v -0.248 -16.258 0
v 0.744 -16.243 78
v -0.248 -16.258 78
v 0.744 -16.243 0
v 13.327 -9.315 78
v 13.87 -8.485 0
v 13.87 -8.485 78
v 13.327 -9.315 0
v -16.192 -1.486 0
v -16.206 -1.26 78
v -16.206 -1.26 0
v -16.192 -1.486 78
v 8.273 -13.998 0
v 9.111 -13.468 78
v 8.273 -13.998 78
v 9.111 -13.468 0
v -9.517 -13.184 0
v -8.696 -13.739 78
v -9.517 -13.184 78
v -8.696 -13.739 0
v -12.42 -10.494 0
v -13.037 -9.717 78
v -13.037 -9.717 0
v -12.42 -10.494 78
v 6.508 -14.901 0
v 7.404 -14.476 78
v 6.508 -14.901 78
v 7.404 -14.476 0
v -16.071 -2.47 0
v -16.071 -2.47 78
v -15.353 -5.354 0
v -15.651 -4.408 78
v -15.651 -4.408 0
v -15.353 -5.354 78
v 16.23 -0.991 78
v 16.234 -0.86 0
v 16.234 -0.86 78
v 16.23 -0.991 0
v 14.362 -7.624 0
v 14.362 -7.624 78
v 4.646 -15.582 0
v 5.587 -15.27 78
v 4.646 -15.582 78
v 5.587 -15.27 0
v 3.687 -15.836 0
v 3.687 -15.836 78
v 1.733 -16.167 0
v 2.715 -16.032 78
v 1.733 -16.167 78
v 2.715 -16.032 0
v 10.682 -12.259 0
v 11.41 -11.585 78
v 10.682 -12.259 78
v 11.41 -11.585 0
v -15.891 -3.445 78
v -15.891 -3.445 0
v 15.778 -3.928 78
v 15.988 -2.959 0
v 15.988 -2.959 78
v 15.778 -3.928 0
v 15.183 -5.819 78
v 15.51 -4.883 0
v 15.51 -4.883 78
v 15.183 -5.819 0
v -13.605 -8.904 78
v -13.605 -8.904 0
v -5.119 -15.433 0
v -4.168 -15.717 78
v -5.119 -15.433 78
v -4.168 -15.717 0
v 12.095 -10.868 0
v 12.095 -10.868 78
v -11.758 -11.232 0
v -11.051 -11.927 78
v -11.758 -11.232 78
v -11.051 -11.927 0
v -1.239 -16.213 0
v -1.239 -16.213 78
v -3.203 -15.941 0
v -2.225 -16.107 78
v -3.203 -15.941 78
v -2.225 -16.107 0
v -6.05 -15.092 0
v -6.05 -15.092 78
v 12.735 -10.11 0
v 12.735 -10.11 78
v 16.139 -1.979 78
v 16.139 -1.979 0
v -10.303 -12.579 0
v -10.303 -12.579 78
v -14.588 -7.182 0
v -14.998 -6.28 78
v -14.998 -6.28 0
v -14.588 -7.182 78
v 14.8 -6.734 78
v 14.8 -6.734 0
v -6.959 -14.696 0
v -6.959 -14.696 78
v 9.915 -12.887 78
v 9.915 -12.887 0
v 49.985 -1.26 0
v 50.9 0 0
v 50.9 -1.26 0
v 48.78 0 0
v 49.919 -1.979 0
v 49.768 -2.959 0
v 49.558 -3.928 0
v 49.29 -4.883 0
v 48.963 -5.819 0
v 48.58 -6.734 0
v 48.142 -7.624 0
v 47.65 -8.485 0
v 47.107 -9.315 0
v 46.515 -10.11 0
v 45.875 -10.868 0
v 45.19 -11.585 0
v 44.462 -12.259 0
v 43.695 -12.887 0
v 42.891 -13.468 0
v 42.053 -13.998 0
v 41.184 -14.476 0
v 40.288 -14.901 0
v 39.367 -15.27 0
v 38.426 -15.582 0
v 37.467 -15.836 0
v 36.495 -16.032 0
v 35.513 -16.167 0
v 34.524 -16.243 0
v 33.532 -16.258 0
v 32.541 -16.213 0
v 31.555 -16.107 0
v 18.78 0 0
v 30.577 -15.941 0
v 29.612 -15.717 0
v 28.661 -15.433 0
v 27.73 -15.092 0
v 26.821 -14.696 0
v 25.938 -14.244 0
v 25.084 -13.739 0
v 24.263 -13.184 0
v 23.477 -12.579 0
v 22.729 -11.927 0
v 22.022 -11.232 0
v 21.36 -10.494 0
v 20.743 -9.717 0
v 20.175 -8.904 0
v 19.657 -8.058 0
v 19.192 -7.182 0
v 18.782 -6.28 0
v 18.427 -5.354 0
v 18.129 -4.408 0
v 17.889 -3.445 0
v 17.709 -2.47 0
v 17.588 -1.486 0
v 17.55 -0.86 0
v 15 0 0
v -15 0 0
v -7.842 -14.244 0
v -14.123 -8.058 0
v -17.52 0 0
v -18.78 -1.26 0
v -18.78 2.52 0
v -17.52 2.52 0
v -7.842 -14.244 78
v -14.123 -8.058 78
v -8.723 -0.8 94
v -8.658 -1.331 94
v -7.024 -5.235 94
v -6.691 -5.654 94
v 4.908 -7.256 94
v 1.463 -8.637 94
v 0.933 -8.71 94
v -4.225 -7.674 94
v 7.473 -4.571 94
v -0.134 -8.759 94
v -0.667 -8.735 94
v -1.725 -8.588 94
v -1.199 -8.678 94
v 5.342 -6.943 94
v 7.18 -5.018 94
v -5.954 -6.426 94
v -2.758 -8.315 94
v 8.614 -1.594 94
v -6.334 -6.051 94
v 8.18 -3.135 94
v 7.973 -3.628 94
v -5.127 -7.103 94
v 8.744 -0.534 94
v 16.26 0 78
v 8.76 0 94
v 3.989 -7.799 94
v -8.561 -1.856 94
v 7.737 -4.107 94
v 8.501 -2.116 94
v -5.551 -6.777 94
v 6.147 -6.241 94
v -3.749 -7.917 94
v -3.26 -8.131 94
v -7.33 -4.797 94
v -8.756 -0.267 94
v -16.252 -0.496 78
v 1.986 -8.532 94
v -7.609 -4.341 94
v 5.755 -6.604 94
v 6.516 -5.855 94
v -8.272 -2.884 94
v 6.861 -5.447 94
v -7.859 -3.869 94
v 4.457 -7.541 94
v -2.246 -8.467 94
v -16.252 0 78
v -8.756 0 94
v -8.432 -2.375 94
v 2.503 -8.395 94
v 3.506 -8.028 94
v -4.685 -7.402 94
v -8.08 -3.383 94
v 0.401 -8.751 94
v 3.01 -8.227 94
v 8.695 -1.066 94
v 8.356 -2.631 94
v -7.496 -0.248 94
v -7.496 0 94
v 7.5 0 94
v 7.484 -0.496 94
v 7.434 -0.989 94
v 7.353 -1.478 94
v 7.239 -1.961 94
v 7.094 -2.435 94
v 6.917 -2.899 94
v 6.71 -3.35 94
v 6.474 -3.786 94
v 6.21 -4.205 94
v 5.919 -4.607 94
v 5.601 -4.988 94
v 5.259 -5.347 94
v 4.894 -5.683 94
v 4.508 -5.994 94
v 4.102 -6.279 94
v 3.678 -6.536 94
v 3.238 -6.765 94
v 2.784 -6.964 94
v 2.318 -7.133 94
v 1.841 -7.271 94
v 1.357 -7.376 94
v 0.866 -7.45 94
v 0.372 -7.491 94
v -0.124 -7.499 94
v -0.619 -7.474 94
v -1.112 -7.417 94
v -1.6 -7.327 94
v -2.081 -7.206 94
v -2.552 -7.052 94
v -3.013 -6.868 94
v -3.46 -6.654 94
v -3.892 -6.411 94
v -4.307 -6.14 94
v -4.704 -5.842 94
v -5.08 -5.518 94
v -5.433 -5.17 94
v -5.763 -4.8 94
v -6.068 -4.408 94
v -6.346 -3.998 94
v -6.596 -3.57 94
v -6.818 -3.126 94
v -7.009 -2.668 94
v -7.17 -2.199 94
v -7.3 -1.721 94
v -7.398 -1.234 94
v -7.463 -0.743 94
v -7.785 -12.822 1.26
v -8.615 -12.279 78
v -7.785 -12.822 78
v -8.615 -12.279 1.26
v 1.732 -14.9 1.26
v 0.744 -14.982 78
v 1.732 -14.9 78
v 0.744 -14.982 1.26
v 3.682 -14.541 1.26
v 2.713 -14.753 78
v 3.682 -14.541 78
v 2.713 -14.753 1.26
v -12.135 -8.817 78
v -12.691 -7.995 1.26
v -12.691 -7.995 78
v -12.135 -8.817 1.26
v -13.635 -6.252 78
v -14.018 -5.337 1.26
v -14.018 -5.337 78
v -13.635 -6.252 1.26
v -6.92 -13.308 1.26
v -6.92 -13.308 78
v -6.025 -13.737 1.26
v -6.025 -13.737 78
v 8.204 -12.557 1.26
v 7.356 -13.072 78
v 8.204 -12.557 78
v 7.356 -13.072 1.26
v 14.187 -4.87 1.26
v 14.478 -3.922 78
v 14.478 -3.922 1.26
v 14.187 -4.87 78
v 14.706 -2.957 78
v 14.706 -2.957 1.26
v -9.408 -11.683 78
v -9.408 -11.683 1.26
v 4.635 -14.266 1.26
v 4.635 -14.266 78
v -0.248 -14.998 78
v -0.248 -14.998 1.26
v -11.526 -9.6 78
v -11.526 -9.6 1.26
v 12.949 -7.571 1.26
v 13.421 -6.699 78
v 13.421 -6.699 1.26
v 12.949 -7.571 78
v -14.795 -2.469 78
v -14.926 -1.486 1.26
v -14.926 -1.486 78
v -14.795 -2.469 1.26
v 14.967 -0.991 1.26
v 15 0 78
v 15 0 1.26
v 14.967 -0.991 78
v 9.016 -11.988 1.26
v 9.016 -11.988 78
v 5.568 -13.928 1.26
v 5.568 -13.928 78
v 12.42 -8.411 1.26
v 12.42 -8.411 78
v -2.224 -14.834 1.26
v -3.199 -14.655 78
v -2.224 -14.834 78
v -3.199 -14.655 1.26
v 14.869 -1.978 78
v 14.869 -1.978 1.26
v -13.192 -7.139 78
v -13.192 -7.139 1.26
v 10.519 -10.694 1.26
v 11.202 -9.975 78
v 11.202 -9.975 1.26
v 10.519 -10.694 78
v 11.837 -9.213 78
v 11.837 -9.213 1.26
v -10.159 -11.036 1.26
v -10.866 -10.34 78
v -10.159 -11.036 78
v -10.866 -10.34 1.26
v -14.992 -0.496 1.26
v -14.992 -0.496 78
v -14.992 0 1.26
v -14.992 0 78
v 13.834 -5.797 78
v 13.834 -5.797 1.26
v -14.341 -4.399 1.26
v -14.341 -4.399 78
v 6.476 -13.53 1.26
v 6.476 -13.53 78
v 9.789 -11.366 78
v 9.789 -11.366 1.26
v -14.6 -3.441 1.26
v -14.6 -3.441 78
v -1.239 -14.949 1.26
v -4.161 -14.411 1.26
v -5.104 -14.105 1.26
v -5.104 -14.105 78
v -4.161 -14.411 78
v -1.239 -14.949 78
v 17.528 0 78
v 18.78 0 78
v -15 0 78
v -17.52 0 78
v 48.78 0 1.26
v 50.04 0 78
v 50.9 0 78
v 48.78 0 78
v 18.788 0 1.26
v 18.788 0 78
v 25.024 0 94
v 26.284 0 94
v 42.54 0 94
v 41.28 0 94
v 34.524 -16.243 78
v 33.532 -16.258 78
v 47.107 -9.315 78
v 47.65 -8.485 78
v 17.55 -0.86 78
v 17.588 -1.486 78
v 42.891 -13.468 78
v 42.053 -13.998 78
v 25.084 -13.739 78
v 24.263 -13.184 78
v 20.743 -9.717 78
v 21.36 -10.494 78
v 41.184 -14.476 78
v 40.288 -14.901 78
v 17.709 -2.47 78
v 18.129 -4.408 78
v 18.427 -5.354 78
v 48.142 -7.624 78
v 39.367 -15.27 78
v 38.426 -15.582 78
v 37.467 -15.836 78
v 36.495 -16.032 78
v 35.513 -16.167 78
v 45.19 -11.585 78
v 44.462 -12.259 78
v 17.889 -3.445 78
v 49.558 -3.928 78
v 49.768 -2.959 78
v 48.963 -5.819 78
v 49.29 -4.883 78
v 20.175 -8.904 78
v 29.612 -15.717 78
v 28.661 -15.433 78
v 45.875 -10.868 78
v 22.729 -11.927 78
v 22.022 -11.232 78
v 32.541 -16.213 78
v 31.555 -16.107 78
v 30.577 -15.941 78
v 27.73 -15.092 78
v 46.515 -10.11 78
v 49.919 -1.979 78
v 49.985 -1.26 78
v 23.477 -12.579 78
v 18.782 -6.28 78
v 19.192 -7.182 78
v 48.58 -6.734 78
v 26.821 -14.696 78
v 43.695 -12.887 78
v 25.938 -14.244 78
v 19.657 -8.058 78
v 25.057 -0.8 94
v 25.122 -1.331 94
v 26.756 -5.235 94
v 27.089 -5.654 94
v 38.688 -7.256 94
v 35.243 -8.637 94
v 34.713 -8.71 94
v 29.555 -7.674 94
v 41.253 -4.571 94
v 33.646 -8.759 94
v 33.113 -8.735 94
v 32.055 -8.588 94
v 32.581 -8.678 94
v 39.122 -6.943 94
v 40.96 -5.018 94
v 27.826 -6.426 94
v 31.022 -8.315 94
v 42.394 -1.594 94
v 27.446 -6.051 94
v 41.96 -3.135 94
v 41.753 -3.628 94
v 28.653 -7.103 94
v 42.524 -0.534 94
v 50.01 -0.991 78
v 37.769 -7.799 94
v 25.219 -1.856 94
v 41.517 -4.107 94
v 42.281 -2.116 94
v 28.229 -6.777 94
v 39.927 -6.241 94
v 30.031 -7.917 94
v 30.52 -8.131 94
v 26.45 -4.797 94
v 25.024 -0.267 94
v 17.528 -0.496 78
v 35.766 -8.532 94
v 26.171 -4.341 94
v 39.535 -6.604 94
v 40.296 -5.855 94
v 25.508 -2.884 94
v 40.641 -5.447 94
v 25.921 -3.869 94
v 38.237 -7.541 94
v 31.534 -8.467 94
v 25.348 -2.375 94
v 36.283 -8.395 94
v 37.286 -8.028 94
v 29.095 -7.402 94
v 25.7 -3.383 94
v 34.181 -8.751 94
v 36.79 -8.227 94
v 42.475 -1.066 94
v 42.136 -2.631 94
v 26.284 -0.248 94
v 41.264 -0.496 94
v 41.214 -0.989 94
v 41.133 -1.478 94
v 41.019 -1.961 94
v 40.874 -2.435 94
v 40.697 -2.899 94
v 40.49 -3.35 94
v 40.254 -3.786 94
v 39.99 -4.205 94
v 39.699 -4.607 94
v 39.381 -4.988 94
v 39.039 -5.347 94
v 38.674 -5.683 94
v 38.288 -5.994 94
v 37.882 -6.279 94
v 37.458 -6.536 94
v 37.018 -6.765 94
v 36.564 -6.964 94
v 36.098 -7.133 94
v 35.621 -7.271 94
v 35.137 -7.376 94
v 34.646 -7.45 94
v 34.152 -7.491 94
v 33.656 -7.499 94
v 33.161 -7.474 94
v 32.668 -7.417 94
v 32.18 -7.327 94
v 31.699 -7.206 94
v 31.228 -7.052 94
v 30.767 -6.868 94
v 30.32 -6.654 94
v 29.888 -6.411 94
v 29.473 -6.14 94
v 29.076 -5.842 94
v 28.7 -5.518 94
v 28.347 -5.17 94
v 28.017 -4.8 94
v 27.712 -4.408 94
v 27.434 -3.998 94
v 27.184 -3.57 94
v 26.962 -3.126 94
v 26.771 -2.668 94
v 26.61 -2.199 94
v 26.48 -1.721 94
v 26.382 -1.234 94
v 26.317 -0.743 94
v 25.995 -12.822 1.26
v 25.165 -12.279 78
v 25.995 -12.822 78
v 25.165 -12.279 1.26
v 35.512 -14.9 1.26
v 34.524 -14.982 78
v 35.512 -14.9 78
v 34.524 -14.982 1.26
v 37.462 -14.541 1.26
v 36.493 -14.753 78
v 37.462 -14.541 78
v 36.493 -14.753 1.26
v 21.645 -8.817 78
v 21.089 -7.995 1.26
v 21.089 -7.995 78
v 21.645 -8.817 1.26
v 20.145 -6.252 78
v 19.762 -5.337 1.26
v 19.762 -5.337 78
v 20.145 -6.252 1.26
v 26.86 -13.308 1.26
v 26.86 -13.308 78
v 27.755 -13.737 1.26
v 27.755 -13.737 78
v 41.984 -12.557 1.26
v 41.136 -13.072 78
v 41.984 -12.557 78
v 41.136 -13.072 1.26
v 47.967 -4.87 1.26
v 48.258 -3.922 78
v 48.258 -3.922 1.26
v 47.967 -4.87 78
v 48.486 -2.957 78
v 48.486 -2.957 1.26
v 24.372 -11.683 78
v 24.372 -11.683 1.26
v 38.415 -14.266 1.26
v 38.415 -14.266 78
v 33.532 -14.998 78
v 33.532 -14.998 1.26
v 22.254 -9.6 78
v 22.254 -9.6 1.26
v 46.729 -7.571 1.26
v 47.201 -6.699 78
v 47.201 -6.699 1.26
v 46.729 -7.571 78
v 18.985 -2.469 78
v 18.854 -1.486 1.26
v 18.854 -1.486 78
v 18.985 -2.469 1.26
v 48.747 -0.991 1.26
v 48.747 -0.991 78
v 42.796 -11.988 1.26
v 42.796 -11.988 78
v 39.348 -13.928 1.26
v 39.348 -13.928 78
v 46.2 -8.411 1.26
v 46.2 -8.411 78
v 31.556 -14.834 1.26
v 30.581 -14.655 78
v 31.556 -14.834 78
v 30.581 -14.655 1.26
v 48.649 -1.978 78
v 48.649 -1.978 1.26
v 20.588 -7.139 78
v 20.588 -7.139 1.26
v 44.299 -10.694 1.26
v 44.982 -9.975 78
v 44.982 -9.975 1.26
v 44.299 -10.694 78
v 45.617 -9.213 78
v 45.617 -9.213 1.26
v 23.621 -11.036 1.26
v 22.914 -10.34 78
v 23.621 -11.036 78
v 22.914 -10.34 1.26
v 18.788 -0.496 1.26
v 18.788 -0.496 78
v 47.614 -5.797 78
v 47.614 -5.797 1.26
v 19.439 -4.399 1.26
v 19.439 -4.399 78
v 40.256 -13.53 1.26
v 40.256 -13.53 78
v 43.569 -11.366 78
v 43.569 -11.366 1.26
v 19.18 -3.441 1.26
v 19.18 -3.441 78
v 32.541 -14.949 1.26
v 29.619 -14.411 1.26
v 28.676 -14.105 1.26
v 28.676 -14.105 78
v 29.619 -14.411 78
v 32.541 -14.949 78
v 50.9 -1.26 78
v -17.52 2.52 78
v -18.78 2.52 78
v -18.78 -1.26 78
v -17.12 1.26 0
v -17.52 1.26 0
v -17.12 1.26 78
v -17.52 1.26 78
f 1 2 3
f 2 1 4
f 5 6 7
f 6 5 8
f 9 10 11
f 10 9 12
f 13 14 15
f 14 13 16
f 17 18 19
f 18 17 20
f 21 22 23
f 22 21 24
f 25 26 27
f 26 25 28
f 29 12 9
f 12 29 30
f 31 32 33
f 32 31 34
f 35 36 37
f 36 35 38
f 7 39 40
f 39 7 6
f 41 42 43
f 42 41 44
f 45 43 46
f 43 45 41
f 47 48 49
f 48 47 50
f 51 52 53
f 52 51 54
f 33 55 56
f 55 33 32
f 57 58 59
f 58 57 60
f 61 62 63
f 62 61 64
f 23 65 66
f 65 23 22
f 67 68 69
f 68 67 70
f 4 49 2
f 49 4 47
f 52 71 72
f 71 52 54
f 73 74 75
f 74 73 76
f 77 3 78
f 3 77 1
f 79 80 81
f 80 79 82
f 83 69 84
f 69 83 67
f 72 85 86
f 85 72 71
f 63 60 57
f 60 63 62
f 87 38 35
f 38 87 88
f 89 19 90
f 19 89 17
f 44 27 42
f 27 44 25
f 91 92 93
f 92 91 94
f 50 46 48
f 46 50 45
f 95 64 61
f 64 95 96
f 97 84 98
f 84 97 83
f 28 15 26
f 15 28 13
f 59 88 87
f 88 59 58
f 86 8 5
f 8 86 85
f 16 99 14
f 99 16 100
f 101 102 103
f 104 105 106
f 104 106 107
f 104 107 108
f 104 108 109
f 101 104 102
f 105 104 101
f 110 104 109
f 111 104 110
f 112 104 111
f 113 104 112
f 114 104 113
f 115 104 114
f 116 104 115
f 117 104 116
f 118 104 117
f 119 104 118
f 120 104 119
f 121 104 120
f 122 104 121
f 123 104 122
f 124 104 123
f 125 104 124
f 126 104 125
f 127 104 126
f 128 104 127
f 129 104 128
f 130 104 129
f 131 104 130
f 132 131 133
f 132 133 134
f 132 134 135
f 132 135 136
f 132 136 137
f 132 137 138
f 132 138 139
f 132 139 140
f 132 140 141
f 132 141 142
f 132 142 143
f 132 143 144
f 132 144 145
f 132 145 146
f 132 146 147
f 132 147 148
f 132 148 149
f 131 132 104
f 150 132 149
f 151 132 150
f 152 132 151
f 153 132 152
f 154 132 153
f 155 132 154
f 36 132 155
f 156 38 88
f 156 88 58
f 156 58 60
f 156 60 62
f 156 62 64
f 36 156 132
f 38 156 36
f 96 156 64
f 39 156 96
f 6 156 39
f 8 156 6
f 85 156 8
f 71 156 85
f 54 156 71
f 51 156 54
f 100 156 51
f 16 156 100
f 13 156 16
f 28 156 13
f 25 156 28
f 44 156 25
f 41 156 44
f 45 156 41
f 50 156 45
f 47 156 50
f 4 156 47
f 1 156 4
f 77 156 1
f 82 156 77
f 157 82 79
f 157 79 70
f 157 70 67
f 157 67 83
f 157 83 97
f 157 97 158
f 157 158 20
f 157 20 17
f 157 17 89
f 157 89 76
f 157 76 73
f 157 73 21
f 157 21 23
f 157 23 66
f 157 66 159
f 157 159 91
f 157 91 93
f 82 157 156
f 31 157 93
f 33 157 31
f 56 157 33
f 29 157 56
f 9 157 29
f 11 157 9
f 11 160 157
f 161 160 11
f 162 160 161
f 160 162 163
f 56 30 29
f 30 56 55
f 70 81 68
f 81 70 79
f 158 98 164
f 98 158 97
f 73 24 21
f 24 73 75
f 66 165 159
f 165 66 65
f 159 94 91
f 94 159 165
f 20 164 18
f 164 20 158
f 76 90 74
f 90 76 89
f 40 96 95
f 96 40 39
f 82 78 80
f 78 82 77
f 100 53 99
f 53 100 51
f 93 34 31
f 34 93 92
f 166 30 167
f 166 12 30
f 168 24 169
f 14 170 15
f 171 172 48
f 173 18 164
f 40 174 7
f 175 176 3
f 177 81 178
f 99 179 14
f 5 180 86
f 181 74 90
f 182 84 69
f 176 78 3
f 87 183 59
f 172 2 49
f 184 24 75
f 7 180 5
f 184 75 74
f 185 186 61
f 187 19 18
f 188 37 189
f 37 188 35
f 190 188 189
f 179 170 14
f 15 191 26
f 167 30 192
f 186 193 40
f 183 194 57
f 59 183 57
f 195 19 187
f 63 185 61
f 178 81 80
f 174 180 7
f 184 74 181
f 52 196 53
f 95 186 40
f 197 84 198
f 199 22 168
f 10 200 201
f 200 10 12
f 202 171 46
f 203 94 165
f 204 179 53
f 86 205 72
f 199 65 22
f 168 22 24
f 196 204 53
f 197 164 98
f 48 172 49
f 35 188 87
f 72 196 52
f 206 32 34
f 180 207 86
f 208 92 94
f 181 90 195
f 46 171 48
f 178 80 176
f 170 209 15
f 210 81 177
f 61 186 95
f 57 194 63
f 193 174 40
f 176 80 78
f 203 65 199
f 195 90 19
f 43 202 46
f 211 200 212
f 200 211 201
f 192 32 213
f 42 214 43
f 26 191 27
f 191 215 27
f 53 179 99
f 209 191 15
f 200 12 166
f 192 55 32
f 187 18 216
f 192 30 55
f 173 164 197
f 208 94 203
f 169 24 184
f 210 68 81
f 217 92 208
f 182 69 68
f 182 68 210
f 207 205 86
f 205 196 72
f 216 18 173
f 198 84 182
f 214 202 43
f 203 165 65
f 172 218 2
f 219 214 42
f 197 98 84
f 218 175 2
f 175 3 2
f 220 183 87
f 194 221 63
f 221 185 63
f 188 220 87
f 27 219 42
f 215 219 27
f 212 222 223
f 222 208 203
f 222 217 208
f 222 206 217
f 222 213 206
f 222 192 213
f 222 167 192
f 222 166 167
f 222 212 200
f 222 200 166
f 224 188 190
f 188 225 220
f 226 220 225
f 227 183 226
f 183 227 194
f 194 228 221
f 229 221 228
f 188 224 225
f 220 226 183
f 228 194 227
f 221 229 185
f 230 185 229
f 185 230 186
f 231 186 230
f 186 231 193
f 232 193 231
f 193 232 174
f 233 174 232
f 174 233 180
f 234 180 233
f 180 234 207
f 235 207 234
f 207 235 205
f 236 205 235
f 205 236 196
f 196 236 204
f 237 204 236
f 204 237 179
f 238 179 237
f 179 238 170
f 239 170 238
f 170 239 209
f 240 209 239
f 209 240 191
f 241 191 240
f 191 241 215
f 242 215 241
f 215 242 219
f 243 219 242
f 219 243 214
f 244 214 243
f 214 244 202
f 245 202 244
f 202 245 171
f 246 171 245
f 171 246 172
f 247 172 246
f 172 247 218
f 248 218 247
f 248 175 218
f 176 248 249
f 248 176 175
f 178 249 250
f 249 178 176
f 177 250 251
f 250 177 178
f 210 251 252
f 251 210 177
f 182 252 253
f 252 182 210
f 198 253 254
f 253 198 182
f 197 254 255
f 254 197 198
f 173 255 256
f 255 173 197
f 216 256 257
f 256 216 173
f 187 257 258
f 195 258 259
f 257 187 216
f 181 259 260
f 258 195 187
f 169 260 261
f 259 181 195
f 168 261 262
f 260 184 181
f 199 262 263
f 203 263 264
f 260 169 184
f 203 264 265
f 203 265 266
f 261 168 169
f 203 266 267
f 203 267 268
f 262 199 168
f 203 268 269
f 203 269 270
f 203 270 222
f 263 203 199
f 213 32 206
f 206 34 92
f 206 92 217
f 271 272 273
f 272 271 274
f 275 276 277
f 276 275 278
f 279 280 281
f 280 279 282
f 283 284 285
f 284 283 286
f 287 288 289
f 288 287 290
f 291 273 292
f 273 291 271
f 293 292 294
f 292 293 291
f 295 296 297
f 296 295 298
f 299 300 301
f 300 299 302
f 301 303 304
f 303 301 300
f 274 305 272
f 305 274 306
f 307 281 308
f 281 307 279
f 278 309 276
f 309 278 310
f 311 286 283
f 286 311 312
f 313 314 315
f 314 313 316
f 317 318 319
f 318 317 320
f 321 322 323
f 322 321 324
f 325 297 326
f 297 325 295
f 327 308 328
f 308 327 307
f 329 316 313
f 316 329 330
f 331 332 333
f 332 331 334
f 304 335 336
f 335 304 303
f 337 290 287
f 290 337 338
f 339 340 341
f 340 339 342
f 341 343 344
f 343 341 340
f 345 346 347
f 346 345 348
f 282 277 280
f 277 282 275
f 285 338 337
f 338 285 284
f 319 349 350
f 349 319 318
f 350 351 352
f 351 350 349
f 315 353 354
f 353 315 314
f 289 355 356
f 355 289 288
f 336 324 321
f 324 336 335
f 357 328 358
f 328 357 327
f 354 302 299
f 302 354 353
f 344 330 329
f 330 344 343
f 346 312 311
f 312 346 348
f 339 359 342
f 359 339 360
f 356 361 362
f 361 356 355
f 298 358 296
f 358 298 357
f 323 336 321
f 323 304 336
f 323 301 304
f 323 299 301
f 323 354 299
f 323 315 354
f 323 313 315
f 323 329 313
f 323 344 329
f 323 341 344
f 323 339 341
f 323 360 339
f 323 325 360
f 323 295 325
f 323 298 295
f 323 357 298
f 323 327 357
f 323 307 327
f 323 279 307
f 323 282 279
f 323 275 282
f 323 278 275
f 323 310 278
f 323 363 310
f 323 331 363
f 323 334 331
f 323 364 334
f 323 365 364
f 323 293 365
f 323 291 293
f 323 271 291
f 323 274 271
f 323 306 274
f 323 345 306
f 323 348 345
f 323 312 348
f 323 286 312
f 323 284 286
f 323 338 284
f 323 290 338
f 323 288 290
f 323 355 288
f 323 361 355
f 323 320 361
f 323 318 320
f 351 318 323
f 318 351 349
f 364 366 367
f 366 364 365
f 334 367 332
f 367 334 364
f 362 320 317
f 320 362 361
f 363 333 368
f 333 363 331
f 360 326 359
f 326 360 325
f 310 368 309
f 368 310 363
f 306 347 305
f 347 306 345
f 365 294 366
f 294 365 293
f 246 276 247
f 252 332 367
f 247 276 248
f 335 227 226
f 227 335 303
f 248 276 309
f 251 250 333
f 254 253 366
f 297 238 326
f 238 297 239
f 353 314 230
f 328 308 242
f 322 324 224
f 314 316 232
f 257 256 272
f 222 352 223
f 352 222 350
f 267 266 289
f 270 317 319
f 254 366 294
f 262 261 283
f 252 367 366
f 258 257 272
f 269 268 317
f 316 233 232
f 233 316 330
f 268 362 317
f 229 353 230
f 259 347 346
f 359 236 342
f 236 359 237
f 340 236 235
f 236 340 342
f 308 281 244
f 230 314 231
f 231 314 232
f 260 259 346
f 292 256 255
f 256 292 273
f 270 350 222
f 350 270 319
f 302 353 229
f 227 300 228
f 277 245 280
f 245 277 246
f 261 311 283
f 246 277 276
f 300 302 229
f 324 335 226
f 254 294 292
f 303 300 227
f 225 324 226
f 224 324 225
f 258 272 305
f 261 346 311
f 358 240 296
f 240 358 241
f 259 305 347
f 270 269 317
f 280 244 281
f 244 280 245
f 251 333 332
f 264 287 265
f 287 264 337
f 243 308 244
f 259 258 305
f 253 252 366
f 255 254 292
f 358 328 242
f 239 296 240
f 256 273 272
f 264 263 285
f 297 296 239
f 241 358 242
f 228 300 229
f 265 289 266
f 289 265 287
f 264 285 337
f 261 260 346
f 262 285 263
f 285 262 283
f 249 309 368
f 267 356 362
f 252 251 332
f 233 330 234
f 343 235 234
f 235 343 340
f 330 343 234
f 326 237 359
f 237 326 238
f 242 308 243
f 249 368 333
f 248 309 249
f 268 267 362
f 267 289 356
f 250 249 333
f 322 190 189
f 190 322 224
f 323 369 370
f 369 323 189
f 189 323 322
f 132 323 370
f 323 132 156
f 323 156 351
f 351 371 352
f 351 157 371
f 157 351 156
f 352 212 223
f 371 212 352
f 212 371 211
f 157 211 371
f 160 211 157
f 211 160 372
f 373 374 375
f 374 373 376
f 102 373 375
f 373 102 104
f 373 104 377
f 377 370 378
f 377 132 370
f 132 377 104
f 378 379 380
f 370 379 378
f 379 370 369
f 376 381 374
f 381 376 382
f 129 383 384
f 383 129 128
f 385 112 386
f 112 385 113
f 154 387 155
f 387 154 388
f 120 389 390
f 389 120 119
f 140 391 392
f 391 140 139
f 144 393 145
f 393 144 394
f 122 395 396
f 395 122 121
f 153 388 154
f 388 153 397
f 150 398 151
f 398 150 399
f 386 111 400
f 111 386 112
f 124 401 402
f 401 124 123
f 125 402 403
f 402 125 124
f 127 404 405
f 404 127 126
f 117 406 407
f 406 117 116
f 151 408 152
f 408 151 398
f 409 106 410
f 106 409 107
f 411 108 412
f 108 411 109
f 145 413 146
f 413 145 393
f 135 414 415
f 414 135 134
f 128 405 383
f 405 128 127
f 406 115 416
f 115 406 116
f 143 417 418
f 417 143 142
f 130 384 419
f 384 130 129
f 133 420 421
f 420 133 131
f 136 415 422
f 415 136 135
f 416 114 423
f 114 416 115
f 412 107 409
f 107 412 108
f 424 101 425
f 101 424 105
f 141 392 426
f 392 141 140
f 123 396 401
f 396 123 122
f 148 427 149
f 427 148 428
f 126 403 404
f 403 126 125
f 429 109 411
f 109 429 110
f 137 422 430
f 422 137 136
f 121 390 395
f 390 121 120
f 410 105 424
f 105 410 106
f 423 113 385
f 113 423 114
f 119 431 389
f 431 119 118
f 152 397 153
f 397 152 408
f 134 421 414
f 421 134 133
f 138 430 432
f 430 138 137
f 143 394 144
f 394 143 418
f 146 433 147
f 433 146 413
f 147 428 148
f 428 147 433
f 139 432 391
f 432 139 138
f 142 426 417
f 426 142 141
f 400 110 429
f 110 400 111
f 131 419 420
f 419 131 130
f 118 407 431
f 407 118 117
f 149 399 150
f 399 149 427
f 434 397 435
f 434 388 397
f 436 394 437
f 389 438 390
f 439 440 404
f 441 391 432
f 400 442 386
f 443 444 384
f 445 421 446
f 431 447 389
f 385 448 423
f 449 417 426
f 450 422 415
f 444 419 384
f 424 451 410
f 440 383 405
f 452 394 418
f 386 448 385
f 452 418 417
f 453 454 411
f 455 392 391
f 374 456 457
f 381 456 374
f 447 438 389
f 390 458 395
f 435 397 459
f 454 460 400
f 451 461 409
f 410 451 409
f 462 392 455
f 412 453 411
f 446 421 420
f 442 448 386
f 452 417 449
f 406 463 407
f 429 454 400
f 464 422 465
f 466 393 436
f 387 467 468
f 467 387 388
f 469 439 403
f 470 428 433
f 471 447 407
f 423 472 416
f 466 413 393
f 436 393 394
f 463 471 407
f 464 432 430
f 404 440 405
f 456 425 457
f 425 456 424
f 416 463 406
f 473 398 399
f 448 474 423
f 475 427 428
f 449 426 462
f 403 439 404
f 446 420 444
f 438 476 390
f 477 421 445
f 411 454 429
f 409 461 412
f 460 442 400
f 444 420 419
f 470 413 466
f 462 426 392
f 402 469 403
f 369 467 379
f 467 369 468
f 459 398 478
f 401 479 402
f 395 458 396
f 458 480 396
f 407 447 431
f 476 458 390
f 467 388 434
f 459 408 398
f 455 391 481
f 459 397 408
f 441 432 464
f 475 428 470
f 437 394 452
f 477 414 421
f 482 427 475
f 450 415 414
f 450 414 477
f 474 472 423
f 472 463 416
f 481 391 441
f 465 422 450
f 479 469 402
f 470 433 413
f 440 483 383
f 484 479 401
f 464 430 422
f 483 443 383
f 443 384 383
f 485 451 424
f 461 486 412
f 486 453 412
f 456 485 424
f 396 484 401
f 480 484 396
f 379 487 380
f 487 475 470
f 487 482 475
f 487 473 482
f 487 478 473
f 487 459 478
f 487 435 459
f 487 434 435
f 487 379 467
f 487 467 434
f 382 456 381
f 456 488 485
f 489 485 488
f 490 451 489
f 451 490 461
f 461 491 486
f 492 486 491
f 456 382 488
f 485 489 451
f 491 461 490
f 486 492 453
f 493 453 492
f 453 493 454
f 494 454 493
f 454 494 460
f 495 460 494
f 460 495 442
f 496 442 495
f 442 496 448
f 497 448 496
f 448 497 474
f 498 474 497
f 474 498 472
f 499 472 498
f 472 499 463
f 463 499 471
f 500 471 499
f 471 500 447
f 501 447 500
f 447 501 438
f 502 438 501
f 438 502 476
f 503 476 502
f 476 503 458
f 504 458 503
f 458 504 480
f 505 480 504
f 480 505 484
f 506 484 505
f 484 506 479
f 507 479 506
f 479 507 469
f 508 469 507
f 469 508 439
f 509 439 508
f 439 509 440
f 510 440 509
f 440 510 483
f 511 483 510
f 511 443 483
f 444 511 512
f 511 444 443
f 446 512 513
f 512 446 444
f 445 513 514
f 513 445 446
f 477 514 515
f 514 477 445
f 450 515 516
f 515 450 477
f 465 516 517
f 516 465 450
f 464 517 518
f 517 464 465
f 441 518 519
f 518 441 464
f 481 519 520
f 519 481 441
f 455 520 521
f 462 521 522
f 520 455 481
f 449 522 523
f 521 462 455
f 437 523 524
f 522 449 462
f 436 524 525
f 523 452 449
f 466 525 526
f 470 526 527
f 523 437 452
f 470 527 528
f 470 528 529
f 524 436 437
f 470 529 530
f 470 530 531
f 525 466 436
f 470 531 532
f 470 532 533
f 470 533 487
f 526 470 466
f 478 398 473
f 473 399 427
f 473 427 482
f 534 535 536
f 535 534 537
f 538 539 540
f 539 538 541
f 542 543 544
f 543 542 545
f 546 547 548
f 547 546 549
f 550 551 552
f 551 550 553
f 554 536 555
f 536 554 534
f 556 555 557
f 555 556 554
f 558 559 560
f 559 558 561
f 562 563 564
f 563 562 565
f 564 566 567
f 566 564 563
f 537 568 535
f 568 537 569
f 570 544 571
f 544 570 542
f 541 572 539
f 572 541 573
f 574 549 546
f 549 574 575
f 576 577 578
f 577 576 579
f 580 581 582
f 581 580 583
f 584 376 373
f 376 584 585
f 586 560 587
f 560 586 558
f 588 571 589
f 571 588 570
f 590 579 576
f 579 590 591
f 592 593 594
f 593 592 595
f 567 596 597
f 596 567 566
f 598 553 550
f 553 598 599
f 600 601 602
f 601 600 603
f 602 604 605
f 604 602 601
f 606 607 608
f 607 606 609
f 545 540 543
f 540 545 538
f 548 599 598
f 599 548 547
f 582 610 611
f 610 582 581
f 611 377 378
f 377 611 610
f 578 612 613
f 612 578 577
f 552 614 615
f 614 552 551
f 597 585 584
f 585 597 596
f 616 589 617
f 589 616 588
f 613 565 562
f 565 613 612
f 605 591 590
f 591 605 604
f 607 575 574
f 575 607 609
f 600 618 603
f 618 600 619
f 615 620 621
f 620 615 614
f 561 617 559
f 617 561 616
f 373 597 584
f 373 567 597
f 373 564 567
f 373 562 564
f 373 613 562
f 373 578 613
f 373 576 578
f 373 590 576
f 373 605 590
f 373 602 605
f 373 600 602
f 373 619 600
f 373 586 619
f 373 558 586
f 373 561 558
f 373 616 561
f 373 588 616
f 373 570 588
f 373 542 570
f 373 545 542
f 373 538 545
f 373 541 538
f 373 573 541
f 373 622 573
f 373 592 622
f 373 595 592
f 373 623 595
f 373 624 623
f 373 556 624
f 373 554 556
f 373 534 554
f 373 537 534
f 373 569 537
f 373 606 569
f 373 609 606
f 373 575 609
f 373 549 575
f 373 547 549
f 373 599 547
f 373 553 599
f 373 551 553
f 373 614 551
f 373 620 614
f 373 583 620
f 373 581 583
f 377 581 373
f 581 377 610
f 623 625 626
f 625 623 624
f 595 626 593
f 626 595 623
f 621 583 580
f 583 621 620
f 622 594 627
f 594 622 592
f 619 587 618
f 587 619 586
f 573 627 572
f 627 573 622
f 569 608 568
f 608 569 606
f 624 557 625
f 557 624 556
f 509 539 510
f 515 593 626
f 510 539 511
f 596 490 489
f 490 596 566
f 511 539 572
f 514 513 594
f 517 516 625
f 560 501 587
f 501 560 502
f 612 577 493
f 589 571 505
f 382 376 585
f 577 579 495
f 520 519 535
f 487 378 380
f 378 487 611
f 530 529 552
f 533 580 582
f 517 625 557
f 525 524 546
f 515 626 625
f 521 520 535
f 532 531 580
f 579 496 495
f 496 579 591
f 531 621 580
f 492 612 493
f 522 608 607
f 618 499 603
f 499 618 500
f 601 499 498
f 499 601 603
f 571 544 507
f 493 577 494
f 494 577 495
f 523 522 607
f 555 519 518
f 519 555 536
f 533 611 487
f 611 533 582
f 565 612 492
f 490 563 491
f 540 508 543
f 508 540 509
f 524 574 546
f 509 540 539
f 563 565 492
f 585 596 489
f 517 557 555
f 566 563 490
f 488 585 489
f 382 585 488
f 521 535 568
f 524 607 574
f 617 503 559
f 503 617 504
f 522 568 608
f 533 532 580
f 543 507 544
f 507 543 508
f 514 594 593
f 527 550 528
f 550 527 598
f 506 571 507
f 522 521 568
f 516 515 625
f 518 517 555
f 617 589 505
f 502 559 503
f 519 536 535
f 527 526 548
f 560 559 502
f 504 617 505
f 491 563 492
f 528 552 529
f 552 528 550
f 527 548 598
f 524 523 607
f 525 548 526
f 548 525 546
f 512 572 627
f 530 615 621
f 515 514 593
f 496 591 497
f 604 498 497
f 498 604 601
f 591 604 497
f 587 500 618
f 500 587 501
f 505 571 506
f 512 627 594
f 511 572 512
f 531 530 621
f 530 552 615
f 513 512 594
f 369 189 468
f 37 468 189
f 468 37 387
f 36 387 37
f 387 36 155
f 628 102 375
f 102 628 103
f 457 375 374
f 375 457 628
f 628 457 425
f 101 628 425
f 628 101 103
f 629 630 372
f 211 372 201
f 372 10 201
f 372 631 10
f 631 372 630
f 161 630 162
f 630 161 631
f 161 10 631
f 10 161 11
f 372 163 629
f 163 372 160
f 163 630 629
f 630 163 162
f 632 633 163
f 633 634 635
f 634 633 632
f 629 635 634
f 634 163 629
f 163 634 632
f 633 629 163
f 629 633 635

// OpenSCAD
$fa = .1;
$fs = $preview ? 5 : 1;

id1=30.0;
id2=15.0;
h1=78;
h2=94;
twt=1.26;
single_wall=.86;
module whole(){
    difference(){
        union(){
            cylinder(h=h1,d=id1+2*twt);
            translate([0,0,h1])
                cylinder(h=h2-h1,d1=id1+2*twt,d2=id2+2*twt);
        }
        union(){
            translate([0,0,twt]) cylinder(h=h1-twt,d=id1);
            translate([0,0,h1])
                cylinder(h=h2-h1,d1=id1,d2=id2);
        }
    }
}

module half() difference(){
    whole();
    translate([-id1/2-twt-.1,0,-.1])
        cube([id1+2*twt+.2,id2+twt+.1,h2+.2]);
}

half();
translate([id1+twt*3,0,0]) half();
//hinge
translate([id1/2,-single_wall,0]) cube([twt*3,single_wall,h1]);
//catch
translate([id1*1.5+3*twt,-twt,0]) cube([twt+single_wall,twt,h1]);
translate([-id1*.5-twt*3,-twt,0]) cube([3*twt,twt,h1]);
translate([-id1*.5-twt*3,-twt,0]) cube([twt,3*twt,h1]);
x1=-id1*.5-twt-single_wall;
x2=-id1*.5-twt*2;
y1=1*twt;
y2=2*twt;
//triangle bit
linear_extrude(h1) polygon([[x1,y1],[x2,y1],[x2,y2]]);
